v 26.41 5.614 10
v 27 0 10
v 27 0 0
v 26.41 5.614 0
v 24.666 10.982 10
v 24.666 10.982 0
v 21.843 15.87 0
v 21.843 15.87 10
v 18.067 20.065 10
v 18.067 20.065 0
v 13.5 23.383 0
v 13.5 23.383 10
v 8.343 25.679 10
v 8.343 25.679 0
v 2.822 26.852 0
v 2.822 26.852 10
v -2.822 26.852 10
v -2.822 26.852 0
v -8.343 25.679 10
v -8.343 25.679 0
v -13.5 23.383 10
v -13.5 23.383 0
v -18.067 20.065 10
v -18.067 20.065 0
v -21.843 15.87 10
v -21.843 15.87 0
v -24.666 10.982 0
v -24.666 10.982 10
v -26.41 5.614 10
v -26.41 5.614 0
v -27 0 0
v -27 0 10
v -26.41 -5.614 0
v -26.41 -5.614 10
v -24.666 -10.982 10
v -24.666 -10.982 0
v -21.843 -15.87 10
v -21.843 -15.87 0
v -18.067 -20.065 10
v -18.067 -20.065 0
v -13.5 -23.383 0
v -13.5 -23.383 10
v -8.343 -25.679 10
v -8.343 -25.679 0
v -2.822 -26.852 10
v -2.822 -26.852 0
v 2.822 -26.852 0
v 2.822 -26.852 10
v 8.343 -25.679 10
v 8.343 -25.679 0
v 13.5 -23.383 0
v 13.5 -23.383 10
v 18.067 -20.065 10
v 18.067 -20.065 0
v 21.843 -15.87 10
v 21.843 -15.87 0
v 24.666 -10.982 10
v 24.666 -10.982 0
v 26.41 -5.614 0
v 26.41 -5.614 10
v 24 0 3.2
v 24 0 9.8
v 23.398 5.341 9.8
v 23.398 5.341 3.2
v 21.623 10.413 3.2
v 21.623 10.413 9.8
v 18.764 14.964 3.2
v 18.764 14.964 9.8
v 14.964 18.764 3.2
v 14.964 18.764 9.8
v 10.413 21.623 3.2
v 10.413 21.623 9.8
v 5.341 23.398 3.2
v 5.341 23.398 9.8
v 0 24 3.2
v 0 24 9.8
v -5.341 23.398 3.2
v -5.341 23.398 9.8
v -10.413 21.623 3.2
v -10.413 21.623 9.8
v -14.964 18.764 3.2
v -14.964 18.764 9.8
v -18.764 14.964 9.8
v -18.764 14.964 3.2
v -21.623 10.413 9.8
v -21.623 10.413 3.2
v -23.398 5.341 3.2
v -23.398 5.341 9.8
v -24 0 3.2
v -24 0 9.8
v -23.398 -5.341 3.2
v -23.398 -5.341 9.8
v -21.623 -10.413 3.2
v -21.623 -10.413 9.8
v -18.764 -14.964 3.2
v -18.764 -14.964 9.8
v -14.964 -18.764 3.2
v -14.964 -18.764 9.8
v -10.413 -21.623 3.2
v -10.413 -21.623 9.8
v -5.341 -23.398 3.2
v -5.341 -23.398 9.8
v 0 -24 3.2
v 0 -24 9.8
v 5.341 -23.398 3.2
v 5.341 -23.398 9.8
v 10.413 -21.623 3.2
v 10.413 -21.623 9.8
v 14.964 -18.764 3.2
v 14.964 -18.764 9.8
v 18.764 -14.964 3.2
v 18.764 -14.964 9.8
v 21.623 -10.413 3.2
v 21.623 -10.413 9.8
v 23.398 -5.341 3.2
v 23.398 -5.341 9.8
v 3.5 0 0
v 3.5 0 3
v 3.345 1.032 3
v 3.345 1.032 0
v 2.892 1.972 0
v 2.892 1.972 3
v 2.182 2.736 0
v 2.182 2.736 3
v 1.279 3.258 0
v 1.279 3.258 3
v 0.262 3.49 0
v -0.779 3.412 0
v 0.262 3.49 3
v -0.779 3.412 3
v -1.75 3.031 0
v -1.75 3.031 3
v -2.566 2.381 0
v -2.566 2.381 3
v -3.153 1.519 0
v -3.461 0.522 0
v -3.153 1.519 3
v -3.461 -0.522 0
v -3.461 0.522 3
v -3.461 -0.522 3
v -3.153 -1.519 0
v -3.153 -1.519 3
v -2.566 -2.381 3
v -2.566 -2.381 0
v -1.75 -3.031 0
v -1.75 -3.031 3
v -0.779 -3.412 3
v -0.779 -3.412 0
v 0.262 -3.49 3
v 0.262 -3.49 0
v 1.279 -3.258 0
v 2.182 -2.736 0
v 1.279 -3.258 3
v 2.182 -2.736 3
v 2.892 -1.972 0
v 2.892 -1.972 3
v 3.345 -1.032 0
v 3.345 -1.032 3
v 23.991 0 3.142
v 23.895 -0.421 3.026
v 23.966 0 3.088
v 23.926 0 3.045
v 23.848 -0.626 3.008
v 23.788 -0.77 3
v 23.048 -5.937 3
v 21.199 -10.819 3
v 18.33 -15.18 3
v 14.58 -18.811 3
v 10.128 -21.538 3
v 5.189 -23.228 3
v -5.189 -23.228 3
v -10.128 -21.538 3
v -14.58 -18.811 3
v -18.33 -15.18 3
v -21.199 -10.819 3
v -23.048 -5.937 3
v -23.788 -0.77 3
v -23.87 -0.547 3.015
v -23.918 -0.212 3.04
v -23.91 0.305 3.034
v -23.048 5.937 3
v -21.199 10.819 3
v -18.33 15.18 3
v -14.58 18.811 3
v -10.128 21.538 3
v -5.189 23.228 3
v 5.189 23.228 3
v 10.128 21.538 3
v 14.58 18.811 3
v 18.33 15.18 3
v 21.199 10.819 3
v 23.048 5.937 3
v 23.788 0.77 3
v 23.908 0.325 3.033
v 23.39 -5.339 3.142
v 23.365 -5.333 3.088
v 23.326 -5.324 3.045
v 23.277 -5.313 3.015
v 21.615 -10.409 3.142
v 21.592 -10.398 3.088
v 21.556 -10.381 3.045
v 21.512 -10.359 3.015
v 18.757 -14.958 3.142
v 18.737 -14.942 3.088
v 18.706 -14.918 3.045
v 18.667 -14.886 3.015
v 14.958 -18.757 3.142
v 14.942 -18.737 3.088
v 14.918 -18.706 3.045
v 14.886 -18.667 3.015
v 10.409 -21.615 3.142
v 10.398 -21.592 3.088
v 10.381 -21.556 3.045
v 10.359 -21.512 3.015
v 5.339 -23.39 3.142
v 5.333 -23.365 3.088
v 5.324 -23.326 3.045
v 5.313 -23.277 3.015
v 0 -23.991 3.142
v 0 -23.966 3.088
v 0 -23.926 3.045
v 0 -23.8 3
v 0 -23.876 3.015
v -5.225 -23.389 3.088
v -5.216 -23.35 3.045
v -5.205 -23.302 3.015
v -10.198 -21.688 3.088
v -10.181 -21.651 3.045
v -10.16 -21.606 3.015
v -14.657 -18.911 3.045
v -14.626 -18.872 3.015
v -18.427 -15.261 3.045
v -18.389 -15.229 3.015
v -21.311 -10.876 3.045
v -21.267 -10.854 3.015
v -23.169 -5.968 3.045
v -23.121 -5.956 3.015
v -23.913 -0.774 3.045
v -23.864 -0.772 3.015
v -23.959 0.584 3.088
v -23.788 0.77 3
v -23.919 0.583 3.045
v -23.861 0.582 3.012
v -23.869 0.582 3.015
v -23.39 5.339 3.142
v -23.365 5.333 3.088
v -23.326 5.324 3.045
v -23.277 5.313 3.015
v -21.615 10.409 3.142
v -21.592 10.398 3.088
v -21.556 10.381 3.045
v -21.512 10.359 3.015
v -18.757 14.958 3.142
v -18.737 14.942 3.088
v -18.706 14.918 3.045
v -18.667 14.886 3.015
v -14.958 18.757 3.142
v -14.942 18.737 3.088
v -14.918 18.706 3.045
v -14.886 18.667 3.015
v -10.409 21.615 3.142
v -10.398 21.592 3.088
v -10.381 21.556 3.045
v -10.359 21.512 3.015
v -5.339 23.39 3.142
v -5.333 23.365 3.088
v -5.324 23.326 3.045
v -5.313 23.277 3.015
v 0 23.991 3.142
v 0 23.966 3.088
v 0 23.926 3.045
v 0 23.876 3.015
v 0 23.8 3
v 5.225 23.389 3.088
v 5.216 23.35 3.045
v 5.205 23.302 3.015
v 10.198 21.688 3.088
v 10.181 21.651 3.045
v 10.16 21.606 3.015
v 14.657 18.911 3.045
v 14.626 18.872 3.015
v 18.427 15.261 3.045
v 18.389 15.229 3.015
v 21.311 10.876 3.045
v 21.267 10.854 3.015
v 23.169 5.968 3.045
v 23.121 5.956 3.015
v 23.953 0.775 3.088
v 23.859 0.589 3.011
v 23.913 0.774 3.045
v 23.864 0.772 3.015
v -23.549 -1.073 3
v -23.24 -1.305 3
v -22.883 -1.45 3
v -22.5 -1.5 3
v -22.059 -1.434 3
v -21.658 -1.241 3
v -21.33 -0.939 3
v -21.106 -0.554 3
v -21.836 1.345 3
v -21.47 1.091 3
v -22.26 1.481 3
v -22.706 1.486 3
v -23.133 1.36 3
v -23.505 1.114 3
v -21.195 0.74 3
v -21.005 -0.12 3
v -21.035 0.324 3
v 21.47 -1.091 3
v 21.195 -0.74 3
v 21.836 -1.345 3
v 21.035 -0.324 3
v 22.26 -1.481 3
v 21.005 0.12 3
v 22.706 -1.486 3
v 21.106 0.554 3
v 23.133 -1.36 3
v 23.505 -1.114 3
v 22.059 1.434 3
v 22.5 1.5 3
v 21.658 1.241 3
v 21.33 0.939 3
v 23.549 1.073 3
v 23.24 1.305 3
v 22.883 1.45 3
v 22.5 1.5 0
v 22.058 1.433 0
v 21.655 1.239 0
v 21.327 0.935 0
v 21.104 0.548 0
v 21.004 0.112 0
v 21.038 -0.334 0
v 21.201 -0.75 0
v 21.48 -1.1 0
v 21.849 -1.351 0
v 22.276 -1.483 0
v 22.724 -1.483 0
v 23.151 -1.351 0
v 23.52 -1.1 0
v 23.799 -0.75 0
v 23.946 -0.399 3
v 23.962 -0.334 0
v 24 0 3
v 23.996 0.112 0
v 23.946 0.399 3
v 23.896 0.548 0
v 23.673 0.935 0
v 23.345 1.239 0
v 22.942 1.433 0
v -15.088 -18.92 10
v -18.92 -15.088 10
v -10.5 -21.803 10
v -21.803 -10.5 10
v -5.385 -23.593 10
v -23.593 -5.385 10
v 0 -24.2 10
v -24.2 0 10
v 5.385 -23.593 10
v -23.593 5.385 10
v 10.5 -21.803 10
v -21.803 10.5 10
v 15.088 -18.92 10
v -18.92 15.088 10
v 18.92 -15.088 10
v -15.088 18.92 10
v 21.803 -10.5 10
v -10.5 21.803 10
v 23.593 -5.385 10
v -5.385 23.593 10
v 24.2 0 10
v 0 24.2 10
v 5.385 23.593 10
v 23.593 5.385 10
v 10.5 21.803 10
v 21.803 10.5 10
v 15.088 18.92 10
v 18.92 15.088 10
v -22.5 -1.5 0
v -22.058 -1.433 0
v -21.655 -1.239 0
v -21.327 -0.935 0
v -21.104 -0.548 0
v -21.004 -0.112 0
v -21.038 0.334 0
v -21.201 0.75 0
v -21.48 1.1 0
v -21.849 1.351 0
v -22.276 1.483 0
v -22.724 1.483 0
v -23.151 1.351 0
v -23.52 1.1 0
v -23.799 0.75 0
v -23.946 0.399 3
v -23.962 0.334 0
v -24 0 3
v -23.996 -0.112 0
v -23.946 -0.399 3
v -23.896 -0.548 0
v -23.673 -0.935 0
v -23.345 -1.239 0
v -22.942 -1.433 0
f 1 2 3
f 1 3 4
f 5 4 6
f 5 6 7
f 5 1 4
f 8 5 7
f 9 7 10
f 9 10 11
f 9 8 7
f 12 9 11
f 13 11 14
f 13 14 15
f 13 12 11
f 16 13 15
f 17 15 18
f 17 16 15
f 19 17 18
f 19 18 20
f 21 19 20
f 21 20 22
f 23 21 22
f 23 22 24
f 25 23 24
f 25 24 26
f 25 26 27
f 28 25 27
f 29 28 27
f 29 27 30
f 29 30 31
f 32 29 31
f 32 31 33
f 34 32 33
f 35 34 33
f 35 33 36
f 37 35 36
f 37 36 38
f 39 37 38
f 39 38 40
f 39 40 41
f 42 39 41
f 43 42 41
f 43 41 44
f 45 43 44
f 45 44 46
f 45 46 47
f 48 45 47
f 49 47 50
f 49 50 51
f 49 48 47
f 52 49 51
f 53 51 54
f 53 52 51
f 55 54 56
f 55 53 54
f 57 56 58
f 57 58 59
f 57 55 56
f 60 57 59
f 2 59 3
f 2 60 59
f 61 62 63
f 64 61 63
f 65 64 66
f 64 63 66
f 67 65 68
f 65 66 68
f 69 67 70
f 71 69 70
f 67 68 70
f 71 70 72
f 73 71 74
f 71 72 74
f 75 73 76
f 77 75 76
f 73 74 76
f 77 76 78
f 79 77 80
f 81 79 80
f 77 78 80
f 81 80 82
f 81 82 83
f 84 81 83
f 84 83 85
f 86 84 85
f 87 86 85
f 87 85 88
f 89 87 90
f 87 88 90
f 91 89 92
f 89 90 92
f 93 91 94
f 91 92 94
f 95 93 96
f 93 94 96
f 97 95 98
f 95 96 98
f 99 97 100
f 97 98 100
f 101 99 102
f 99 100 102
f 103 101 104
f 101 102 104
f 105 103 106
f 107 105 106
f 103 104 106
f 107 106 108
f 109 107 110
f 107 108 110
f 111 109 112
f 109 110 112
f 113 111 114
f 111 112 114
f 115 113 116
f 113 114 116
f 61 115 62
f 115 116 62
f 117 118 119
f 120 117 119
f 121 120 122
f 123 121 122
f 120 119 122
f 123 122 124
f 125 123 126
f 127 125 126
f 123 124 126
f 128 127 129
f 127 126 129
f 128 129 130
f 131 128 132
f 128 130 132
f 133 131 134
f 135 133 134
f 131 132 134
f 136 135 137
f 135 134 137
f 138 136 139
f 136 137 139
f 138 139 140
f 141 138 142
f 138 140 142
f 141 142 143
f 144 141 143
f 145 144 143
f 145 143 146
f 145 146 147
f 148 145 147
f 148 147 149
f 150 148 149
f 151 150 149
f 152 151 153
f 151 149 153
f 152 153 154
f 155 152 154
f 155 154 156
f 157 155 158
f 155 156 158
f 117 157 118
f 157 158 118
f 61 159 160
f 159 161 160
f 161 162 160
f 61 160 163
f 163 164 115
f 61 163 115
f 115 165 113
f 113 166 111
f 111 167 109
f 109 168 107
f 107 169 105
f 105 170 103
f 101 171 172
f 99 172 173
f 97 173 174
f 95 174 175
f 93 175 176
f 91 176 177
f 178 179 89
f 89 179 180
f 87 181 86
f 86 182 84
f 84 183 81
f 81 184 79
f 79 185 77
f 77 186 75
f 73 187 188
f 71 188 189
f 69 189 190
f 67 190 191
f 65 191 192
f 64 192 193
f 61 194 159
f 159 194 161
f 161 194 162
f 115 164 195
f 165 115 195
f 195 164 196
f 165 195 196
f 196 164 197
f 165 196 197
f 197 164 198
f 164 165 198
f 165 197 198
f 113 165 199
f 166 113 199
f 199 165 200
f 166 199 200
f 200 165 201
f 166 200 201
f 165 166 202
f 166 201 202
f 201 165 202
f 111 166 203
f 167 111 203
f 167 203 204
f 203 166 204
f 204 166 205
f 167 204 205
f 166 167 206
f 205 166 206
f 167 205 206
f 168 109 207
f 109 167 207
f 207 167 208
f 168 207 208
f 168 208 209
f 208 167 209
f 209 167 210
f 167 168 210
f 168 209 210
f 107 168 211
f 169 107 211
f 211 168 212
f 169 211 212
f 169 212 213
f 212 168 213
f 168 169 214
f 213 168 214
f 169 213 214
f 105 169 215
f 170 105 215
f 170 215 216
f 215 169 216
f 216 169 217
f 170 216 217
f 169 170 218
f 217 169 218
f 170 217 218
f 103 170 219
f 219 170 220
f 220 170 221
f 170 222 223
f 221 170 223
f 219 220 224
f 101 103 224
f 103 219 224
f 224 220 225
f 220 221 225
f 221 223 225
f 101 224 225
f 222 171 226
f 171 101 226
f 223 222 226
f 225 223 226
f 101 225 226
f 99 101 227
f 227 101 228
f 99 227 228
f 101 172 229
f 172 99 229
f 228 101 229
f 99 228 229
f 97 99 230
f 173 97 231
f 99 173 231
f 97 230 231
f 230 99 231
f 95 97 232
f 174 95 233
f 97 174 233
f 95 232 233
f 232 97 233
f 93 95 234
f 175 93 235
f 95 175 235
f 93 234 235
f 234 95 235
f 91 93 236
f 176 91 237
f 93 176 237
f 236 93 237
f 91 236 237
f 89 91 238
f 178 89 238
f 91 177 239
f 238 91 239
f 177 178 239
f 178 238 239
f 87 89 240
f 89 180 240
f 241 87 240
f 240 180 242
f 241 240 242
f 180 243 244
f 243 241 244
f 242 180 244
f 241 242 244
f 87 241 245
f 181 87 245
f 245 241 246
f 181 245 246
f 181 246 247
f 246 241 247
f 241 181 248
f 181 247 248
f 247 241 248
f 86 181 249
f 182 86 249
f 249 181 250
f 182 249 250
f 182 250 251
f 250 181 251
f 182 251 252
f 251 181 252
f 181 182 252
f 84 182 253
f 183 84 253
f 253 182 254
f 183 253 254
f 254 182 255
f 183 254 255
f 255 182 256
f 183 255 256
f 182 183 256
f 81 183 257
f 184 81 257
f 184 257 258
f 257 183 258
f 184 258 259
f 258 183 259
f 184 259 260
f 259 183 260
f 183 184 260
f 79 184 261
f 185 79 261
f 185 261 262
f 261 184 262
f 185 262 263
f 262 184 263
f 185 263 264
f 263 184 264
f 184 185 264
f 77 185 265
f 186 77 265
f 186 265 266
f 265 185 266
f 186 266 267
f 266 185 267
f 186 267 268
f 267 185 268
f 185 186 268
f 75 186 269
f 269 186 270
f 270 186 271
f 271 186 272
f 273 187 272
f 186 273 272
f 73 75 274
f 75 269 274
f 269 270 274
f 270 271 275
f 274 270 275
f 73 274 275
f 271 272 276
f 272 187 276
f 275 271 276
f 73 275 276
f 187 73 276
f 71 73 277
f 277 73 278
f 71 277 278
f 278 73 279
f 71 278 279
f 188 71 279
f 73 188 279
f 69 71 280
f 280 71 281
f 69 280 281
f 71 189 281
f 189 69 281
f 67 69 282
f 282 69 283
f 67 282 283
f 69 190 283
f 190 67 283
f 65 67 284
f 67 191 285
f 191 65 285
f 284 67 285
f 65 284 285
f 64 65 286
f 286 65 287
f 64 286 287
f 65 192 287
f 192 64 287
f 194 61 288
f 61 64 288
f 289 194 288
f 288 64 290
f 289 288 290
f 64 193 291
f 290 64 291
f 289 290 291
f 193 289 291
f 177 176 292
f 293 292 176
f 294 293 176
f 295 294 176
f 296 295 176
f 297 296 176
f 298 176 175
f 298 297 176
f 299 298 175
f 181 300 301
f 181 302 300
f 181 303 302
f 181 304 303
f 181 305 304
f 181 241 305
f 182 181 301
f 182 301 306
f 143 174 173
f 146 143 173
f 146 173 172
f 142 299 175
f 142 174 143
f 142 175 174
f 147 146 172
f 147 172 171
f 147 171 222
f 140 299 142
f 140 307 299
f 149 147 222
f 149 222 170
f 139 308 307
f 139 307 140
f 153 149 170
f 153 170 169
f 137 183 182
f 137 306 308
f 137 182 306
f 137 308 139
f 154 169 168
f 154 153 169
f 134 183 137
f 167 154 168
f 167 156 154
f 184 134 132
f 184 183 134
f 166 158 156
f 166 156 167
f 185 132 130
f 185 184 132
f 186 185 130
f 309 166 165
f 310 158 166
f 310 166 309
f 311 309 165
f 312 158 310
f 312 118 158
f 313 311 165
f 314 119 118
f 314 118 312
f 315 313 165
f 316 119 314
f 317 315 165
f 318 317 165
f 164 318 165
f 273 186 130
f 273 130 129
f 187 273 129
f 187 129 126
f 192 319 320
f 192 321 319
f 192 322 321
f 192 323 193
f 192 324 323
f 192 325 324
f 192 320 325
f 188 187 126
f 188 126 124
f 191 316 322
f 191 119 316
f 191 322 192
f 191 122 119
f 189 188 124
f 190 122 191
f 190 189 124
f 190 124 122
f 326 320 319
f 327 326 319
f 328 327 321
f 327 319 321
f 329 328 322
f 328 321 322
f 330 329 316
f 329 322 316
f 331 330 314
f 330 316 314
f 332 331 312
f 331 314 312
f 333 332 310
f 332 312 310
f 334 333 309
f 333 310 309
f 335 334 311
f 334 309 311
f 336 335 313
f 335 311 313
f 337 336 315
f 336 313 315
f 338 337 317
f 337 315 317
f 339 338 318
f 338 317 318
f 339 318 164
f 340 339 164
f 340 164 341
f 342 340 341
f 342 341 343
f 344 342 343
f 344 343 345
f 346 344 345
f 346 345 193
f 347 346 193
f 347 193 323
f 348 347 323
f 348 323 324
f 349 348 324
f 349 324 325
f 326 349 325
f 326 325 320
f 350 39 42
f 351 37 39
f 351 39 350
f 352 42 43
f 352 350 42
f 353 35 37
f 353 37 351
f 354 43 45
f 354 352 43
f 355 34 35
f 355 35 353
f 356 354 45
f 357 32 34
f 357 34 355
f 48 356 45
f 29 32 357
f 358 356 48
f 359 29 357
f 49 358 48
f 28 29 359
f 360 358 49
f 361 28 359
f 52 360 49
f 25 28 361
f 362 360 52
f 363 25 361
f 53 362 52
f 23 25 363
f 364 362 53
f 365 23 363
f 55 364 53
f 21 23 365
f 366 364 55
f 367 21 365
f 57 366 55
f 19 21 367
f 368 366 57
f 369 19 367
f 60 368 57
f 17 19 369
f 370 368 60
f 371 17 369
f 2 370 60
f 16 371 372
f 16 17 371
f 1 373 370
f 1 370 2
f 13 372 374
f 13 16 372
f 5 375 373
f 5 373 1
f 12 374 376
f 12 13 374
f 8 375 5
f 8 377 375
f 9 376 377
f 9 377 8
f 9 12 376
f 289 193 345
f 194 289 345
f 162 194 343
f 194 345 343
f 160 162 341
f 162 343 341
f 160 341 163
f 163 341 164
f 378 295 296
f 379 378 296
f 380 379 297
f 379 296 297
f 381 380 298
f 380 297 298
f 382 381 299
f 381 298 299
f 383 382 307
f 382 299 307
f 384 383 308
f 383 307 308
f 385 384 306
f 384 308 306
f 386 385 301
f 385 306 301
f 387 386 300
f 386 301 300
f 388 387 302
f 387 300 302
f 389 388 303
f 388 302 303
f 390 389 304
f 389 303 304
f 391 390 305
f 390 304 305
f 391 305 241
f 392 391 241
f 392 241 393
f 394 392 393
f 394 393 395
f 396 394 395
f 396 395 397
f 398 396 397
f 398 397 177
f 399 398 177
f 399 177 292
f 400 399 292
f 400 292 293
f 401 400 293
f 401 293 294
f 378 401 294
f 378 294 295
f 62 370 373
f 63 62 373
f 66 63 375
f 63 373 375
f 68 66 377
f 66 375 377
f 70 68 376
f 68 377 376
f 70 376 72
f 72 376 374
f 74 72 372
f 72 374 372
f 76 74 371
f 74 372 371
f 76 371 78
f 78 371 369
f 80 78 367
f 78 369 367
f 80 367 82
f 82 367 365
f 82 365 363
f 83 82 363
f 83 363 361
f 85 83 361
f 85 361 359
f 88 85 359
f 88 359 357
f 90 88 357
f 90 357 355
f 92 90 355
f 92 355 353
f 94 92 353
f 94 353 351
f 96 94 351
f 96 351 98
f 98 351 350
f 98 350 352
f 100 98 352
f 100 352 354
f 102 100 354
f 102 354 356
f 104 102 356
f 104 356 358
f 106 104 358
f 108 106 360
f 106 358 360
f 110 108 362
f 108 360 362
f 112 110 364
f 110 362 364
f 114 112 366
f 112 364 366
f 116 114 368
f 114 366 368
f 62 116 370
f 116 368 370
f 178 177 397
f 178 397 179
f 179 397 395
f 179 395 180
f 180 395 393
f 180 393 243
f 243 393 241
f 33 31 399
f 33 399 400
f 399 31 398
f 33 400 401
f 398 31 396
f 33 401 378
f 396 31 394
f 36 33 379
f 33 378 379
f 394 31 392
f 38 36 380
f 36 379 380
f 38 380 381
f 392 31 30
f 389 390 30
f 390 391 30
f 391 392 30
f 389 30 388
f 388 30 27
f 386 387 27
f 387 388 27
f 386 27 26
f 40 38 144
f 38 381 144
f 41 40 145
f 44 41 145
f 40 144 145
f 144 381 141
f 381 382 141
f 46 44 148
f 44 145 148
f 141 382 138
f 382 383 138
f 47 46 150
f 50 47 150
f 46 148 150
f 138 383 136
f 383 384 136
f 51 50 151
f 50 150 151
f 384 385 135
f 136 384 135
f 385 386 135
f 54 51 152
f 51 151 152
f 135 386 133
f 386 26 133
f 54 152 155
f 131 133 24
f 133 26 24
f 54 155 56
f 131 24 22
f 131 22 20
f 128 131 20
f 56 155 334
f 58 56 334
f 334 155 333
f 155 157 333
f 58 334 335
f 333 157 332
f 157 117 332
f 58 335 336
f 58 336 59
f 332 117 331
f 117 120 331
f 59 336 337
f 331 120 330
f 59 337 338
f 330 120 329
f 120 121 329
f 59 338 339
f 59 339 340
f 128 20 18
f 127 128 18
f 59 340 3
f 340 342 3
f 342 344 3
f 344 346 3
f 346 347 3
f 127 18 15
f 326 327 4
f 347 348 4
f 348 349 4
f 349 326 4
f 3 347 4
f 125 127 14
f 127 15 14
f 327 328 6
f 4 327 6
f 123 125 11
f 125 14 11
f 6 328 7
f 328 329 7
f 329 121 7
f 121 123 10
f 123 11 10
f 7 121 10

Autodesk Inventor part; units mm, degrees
ref_plane "XY Plane" through (0, 0, 0) normal (0, 0, 1) x (1, 0, 0)
sketch "Skizze1" plane through (0, 0, 0) normal (0, 0, 1) x (1, 0, 0)
  circle A0 centre (0, 0) radius 30
  dimension "d0" = 60
extrude "Extrusion1" add sketch "Skizze1" along normal blind 10
sketch "Skizze2" plane through (0, 0, 10) normal (0, 0, 1) x (1, 0, 0)
  circle A0 centre (0, 0) radius 30 projected
  circle A1 centre (0, 0) radius 24
  circle A2 centre (0, 0) radius 3
  dimension "d3" = 6
  dimension "d4" = 6
extrude "Extrusion2" cut sketch "Skizze2" against normal blind 7 contours A1 | A2
sketch "Skizze3" plane through (0, 0, 10) normal (0, 0, 1) x (1, 0, 0)
  circle A0 centre (0, 0) radius 3.5
  dimension "d7" = 7
extrude "Extrusion3" cut sketch "Skizze3" along normal through all both and the other way through all
fillet "Rundung1" radius 0.2 1 edges at (-24, 0, 3)
chamfer "Fase1" distance 0.2 angle 45 3 edges at (-30, 0, 0) (-30, 0, 10) (-24, 0, 10)
sketch "Skizze4" plane through (0, 0, 10) normal (0, 0, 1) x (1, 0, 0)
  circle A0 centre (0, 0) radius 27
  circle A1 centre (0, 0) radius 37
  dimension "d14" = 54
  dimension "d15" = 10
extrude "Extrusion4" cut sketch "Skizze4" along normal through all both and the other way through all
ref_plane "Arbeitsebene1" through (22.5, 0, 0) normal (1, 0, 0) x (0, 1, 0)
ref_plane "Arbeitsebene2" through (0, 0, 0) normal (0, 1, 0) x (-1, 0, 0)
hole "Bohrung2" at (22.5, 0, 0) direction (0, 0, 1) diameter 3 depth 3 tip angle 118
pattern_circular "Runde Anordnung2" count 2 over 360 about axis through (0, 0, 10) along (0, 0, 1) of "Bohrung2"
sketch "Skizze6" plane through (0, 0, 10) normal (0, 0, 1) x (1, 0, 0)
  circle A0 centre (-22.5, 0) radius 1.5
  circle A1 centre (0, 0) radius 24.2 projected
  dimension "d25" = 3
  dimension "d26" = 22.5
sketch "Skizze5" plane through (0, 0, 10) normal (0, 0, 1) x (1, 0, 0)
  circle A0 centre (0, 0) radius 3.2 projected
  circle A1 centre (0, 0) radius 27.5
  circle A2 centre (0, 0) radius 30
  dimension "d18" = 55
  dimension "d19" = 60
properties part number "felge" material "Aluminium 6061"
